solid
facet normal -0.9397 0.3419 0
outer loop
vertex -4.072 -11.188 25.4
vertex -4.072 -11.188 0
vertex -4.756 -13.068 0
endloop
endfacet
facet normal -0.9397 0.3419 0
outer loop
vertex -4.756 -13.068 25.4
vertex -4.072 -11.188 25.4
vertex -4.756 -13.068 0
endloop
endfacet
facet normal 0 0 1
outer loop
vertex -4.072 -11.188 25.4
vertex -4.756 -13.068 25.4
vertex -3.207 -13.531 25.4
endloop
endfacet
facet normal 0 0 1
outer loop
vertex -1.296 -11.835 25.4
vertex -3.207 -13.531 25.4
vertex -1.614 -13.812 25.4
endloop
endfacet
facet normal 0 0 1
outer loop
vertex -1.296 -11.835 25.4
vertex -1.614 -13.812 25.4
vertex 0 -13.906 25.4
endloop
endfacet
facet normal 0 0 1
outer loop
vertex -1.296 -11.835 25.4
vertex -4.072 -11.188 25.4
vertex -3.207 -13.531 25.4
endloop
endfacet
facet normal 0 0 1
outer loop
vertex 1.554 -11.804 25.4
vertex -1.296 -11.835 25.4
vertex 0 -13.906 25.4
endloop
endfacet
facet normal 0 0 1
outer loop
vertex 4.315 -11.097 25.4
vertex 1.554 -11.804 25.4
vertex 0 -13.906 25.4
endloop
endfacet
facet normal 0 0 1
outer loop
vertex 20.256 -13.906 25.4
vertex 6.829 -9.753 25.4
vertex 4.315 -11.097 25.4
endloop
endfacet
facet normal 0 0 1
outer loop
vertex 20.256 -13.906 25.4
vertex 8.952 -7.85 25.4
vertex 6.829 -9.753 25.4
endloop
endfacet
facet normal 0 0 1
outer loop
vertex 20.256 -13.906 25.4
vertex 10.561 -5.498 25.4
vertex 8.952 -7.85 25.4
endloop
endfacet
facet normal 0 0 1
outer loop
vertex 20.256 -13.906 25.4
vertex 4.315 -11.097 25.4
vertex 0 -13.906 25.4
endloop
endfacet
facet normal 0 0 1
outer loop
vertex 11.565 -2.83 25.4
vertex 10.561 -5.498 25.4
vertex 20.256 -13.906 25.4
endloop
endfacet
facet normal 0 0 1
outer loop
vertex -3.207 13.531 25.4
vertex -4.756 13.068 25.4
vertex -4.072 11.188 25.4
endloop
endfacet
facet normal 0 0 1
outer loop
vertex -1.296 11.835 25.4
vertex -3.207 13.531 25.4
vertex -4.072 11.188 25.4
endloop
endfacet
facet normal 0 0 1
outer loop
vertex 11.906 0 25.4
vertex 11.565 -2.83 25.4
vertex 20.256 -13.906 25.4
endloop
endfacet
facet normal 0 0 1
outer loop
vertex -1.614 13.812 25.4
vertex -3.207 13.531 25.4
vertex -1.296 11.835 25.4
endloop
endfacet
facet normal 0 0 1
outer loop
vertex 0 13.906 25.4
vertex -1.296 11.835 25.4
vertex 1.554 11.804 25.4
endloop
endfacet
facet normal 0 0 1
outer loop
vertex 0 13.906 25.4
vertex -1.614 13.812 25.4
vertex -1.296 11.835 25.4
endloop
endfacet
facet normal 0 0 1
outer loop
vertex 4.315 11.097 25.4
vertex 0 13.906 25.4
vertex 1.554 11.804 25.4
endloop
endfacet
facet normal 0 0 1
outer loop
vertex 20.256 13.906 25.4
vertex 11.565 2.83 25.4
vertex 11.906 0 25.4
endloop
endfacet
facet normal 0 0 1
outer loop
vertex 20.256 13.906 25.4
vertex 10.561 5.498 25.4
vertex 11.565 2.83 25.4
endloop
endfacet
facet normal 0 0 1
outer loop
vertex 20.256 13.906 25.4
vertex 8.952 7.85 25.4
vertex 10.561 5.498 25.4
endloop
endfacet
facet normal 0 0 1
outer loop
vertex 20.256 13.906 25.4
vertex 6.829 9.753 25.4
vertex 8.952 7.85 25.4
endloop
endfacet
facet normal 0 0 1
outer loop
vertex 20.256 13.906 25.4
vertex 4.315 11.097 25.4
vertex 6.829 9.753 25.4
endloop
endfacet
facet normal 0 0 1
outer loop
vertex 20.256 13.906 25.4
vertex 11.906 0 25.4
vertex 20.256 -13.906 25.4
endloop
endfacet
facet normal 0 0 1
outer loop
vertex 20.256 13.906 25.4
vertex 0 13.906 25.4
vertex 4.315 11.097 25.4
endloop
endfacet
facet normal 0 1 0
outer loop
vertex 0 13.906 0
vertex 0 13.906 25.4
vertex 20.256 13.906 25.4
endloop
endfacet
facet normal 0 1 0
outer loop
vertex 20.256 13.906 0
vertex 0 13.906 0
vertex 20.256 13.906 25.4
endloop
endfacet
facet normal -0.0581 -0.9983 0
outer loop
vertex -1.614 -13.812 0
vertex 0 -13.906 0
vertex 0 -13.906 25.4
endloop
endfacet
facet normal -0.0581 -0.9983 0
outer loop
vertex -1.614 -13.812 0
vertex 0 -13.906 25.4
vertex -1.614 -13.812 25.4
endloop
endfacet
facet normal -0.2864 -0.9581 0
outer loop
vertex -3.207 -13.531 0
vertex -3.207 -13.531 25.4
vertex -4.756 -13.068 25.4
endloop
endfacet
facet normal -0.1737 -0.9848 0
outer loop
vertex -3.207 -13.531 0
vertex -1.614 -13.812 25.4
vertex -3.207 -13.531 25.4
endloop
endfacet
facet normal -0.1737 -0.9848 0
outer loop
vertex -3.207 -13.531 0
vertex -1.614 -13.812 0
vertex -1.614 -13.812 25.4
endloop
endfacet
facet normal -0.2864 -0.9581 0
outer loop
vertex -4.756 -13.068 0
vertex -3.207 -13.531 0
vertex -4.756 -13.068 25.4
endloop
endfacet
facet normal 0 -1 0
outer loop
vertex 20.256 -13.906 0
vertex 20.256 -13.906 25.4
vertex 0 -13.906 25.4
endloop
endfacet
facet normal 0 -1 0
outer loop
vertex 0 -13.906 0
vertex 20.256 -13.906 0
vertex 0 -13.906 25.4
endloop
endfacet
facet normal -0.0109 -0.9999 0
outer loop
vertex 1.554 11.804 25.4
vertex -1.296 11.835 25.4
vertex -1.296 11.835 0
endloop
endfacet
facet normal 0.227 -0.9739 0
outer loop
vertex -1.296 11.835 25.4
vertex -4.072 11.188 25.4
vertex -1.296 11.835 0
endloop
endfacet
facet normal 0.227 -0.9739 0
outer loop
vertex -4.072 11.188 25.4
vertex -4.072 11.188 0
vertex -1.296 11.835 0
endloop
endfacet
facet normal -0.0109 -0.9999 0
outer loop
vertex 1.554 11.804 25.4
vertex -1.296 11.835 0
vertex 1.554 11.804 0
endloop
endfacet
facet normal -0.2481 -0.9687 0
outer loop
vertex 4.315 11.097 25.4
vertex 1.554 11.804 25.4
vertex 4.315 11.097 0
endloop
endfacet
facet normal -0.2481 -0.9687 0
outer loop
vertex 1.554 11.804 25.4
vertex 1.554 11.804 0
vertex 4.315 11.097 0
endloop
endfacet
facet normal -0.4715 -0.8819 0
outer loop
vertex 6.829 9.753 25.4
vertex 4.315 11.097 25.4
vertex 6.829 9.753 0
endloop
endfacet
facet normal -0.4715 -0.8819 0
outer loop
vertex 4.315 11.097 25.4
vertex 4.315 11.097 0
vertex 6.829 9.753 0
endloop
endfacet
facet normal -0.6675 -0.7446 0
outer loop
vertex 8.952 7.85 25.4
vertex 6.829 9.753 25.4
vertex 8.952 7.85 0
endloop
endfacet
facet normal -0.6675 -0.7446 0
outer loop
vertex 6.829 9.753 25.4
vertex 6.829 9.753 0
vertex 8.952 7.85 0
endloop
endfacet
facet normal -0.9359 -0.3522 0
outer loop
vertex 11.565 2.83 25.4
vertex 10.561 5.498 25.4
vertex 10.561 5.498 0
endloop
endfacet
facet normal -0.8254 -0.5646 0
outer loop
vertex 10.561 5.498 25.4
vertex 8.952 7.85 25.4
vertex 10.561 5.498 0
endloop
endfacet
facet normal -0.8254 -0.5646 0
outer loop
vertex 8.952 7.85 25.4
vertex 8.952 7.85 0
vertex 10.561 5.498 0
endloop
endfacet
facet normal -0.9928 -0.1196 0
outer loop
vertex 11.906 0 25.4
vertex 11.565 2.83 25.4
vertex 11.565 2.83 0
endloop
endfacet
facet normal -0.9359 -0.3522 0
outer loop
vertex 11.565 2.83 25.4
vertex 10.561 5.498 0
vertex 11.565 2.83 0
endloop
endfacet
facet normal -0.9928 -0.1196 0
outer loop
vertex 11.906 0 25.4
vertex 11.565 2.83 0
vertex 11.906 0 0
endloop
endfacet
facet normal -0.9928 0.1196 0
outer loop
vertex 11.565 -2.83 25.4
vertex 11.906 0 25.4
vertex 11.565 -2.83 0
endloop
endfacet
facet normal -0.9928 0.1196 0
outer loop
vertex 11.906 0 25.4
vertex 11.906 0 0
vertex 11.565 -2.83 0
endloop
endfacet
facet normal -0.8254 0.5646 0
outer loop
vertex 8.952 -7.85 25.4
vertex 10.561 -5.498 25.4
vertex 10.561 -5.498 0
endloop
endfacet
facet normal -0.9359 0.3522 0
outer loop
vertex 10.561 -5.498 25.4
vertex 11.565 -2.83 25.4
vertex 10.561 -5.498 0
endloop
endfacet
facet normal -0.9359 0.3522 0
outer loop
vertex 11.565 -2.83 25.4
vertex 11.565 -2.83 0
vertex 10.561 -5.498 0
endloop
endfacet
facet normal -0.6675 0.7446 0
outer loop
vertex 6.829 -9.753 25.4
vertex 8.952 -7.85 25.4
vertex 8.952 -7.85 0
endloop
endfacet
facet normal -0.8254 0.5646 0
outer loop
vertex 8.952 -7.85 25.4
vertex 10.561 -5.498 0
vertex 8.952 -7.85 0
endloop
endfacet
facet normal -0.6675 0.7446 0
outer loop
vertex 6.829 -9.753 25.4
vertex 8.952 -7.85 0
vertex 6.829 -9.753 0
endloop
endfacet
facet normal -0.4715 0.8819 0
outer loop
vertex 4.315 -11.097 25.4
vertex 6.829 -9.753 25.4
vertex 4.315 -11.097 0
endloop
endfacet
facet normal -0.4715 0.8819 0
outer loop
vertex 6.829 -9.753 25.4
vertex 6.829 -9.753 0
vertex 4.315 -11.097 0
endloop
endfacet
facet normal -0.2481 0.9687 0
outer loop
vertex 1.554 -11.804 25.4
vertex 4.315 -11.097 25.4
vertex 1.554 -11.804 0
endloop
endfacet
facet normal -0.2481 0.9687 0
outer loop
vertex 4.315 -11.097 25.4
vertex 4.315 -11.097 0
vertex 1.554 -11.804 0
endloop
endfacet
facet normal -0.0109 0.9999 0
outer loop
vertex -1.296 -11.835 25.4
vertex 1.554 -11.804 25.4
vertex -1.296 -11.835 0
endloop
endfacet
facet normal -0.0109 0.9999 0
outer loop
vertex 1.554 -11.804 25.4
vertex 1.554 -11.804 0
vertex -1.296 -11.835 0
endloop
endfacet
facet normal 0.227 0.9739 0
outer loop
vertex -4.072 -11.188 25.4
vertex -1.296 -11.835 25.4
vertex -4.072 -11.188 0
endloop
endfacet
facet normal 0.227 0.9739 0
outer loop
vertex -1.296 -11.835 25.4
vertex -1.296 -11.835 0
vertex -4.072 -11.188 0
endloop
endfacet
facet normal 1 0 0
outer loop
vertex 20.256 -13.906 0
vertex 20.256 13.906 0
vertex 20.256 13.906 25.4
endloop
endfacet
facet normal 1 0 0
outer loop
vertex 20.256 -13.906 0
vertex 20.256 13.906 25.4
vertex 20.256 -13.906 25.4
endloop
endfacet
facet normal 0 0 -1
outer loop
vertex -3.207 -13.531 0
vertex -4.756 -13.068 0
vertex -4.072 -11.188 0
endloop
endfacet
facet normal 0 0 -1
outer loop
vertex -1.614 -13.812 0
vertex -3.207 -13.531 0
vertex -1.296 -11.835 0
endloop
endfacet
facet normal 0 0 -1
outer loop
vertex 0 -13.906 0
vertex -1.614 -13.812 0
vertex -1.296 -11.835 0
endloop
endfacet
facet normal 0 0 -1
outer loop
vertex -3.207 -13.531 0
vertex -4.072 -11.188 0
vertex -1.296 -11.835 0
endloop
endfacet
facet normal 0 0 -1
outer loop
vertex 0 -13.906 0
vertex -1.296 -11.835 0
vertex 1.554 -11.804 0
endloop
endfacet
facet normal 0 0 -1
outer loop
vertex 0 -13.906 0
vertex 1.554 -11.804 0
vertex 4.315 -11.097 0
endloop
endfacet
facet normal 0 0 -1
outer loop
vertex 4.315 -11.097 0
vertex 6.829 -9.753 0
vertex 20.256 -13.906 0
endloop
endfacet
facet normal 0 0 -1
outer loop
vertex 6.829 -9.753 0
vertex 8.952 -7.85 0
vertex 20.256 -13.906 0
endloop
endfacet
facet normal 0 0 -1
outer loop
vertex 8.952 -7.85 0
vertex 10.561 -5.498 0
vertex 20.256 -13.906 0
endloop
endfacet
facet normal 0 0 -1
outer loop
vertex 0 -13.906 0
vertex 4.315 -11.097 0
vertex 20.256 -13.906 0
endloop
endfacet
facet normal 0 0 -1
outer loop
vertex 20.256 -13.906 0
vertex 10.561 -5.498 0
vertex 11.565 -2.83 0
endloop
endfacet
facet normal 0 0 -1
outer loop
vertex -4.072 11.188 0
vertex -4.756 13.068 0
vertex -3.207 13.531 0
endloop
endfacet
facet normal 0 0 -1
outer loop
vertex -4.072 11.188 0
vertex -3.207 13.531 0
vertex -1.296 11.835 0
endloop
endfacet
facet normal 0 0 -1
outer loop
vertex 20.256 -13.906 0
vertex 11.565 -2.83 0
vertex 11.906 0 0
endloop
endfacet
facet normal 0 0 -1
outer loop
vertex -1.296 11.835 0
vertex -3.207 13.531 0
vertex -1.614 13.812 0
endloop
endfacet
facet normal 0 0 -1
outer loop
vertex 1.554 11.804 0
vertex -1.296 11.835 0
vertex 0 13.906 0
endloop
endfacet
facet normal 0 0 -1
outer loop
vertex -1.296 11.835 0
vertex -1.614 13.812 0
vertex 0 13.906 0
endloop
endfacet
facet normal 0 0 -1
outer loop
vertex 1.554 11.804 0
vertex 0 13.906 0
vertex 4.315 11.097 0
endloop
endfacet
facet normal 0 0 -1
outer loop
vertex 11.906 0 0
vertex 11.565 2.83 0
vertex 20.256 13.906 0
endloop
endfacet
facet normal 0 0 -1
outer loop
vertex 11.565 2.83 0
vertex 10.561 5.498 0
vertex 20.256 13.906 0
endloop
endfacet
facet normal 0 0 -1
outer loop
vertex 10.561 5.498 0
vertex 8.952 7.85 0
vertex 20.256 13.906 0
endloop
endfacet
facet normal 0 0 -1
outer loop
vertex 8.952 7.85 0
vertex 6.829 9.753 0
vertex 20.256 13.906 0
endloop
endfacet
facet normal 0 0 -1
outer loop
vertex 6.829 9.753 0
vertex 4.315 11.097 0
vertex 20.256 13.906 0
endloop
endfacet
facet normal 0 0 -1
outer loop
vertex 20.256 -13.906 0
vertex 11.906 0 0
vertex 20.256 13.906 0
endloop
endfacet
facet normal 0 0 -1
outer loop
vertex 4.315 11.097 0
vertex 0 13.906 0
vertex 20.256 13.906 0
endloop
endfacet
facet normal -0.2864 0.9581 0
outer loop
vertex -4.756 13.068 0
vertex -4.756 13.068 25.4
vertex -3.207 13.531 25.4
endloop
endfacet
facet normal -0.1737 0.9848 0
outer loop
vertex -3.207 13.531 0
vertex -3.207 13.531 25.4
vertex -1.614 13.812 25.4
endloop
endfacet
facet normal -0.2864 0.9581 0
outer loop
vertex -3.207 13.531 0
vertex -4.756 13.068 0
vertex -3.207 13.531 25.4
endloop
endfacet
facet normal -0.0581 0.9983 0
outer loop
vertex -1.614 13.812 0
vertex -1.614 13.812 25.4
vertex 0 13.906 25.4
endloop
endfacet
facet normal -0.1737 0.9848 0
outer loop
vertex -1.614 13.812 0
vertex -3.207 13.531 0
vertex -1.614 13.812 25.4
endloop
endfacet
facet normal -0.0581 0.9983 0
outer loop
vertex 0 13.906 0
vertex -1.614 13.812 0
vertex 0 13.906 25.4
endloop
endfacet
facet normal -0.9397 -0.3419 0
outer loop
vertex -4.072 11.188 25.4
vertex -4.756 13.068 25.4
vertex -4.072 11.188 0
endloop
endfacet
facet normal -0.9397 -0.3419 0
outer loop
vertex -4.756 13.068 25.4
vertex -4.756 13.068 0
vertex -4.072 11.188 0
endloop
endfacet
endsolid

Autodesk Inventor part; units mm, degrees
ref_plane "YZ Plane" through (0, 0, 0) normal (1, 0, 0) x (0, 1, 0)
ref_plane "XZ Plane" through (0, 0, 0) normal (0, 1, 0) x (-1, 0, 0)
sketch "Sketch1" plane through (0, 0, 0) normal (0, 0, 1) x (1, 0, 0)
  line L0 (-4.0722, -11.1882) -> (-4.7562, -13.0676)
  arc A0 (-4.7562, -13.0676) -> (-4.7562, 13.0676) centre (0, 0) ccw
  line L1 (-4.7562, 13.0676) -> (-4.0722, 11.1882)
  arc A1 (-4.0722, -11.1882) -> (-4.0722, 11.1882) centre (0, 0) ccw
  line L2 (0, 13.9062) -> (20.2562, 13.9062)
  line L3 (20.2562, 13.9062) -> (20.2562, -13.9062)
  line L4 (20.2562, -13.9062) -> (0, -13.9062)
  line L5 (13.9062, 13.9062) -> (13.9063, -13.9062) construction
  line L6 (17.0812, 13.9062) -> (17.0813, -13.9062) construction
  dimension "d0" = 11.9062
  dimension "d1" = 2
  dimension "d2" = 140
  dimension "d3" = 6.35
  dimension "d4" = 3.175
extrude "Extrusion1" add sketch "Sketch1" along normal blind 25.4
ref_plane "mirror-plane" through (17.0812, 13.9062, 0) normal (1, 0, 0) x (0, 0, -1)
equation "\"d1\" = wall"
equation "\"d2\" = angle"
equation "\"d4\" = 0.5 * d3"
equation "\"angle\" = 140deg"
equation "\"wall\" = 2"
properties part number "hook-thingy-base-01"
